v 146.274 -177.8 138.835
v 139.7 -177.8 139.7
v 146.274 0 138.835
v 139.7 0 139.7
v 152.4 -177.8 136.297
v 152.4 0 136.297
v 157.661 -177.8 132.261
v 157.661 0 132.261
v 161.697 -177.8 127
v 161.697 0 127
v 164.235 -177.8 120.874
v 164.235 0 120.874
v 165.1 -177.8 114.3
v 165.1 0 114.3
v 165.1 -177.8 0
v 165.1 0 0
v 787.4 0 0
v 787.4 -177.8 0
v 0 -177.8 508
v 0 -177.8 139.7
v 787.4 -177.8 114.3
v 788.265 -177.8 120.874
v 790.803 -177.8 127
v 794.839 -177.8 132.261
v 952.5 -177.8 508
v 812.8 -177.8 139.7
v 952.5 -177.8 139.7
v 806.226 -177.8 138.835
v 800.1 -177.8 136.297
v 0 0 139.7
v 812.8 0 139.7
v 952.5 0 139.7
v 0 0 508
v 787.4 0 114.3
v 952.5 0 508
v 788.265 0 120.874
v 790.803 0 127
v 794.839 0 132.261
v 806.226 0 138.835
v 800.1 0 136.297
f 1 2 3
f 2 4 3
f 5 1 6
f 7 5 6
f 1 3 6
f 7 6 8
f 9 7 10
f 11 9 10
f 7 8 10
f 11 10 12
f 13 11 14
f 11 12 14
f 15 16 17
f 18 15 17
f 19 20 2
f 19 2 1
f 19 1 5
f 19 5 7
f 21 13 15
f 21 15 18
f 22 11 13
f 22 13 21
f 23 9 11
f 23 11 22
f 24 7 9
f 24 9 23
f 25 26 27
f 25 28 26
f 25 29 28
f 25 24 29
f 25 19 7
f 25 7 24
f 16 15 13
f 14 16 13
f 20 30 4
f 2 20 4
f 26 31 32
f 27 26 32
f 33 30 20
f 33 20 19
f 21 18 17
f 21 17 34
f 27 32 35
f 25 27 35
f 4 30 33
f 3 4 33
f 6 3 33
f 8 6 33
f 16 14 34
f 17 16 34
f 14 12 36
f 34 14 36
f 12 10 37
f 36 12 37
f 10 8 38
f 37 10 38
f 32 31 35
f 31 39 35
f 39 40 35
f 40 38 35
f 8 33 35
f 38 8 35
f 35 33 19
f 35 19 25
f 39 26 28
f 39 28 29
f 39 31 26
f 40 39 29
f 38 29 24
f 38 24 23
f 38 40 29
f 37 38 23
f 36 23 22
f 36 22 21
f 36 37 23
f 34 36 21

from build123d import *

# Parameters (mm, degrees)
F0_W     = 952.5
F0_H     = 508
F1_DEPTH = 177.8
F2_W     = 165.1
F2_H     = 139.7
F3_DEPTH = 177.801
F4_R     = 25.4


with BuildPart() as f1:
    # F0 (on Front) → F1 (new body)
    with BuildSketch(Plane.XZ):
        with Locations((476.25, 254)):
            Rectangle(F0_W, F0_H)
    extrude(amount=F1_DEPTH)

    # F2 (on face) → F3 (cut, through all)
    with BuildSketch(Plane.XZ.offset(177.8)):
        with Locations((82.55, 69.85)):
            Rectangle(F2_W, F2_H)
        with Locations((869.95, 69.85)):
            Rectangle(F2_W, F2_H)
    extrude(amount=-F3_DEPTH, mode=Mode.SUBTRACT)

    # F4
    f4_edges = [f1.edges().sort_by_distance(p)[0] for p in [
        (165.1, -88.9, 139.7),
        (787.4, -88.9, 139.7),
    ]]
    fillet(f4_edges, radius=F4_R)


solid = f1.part
